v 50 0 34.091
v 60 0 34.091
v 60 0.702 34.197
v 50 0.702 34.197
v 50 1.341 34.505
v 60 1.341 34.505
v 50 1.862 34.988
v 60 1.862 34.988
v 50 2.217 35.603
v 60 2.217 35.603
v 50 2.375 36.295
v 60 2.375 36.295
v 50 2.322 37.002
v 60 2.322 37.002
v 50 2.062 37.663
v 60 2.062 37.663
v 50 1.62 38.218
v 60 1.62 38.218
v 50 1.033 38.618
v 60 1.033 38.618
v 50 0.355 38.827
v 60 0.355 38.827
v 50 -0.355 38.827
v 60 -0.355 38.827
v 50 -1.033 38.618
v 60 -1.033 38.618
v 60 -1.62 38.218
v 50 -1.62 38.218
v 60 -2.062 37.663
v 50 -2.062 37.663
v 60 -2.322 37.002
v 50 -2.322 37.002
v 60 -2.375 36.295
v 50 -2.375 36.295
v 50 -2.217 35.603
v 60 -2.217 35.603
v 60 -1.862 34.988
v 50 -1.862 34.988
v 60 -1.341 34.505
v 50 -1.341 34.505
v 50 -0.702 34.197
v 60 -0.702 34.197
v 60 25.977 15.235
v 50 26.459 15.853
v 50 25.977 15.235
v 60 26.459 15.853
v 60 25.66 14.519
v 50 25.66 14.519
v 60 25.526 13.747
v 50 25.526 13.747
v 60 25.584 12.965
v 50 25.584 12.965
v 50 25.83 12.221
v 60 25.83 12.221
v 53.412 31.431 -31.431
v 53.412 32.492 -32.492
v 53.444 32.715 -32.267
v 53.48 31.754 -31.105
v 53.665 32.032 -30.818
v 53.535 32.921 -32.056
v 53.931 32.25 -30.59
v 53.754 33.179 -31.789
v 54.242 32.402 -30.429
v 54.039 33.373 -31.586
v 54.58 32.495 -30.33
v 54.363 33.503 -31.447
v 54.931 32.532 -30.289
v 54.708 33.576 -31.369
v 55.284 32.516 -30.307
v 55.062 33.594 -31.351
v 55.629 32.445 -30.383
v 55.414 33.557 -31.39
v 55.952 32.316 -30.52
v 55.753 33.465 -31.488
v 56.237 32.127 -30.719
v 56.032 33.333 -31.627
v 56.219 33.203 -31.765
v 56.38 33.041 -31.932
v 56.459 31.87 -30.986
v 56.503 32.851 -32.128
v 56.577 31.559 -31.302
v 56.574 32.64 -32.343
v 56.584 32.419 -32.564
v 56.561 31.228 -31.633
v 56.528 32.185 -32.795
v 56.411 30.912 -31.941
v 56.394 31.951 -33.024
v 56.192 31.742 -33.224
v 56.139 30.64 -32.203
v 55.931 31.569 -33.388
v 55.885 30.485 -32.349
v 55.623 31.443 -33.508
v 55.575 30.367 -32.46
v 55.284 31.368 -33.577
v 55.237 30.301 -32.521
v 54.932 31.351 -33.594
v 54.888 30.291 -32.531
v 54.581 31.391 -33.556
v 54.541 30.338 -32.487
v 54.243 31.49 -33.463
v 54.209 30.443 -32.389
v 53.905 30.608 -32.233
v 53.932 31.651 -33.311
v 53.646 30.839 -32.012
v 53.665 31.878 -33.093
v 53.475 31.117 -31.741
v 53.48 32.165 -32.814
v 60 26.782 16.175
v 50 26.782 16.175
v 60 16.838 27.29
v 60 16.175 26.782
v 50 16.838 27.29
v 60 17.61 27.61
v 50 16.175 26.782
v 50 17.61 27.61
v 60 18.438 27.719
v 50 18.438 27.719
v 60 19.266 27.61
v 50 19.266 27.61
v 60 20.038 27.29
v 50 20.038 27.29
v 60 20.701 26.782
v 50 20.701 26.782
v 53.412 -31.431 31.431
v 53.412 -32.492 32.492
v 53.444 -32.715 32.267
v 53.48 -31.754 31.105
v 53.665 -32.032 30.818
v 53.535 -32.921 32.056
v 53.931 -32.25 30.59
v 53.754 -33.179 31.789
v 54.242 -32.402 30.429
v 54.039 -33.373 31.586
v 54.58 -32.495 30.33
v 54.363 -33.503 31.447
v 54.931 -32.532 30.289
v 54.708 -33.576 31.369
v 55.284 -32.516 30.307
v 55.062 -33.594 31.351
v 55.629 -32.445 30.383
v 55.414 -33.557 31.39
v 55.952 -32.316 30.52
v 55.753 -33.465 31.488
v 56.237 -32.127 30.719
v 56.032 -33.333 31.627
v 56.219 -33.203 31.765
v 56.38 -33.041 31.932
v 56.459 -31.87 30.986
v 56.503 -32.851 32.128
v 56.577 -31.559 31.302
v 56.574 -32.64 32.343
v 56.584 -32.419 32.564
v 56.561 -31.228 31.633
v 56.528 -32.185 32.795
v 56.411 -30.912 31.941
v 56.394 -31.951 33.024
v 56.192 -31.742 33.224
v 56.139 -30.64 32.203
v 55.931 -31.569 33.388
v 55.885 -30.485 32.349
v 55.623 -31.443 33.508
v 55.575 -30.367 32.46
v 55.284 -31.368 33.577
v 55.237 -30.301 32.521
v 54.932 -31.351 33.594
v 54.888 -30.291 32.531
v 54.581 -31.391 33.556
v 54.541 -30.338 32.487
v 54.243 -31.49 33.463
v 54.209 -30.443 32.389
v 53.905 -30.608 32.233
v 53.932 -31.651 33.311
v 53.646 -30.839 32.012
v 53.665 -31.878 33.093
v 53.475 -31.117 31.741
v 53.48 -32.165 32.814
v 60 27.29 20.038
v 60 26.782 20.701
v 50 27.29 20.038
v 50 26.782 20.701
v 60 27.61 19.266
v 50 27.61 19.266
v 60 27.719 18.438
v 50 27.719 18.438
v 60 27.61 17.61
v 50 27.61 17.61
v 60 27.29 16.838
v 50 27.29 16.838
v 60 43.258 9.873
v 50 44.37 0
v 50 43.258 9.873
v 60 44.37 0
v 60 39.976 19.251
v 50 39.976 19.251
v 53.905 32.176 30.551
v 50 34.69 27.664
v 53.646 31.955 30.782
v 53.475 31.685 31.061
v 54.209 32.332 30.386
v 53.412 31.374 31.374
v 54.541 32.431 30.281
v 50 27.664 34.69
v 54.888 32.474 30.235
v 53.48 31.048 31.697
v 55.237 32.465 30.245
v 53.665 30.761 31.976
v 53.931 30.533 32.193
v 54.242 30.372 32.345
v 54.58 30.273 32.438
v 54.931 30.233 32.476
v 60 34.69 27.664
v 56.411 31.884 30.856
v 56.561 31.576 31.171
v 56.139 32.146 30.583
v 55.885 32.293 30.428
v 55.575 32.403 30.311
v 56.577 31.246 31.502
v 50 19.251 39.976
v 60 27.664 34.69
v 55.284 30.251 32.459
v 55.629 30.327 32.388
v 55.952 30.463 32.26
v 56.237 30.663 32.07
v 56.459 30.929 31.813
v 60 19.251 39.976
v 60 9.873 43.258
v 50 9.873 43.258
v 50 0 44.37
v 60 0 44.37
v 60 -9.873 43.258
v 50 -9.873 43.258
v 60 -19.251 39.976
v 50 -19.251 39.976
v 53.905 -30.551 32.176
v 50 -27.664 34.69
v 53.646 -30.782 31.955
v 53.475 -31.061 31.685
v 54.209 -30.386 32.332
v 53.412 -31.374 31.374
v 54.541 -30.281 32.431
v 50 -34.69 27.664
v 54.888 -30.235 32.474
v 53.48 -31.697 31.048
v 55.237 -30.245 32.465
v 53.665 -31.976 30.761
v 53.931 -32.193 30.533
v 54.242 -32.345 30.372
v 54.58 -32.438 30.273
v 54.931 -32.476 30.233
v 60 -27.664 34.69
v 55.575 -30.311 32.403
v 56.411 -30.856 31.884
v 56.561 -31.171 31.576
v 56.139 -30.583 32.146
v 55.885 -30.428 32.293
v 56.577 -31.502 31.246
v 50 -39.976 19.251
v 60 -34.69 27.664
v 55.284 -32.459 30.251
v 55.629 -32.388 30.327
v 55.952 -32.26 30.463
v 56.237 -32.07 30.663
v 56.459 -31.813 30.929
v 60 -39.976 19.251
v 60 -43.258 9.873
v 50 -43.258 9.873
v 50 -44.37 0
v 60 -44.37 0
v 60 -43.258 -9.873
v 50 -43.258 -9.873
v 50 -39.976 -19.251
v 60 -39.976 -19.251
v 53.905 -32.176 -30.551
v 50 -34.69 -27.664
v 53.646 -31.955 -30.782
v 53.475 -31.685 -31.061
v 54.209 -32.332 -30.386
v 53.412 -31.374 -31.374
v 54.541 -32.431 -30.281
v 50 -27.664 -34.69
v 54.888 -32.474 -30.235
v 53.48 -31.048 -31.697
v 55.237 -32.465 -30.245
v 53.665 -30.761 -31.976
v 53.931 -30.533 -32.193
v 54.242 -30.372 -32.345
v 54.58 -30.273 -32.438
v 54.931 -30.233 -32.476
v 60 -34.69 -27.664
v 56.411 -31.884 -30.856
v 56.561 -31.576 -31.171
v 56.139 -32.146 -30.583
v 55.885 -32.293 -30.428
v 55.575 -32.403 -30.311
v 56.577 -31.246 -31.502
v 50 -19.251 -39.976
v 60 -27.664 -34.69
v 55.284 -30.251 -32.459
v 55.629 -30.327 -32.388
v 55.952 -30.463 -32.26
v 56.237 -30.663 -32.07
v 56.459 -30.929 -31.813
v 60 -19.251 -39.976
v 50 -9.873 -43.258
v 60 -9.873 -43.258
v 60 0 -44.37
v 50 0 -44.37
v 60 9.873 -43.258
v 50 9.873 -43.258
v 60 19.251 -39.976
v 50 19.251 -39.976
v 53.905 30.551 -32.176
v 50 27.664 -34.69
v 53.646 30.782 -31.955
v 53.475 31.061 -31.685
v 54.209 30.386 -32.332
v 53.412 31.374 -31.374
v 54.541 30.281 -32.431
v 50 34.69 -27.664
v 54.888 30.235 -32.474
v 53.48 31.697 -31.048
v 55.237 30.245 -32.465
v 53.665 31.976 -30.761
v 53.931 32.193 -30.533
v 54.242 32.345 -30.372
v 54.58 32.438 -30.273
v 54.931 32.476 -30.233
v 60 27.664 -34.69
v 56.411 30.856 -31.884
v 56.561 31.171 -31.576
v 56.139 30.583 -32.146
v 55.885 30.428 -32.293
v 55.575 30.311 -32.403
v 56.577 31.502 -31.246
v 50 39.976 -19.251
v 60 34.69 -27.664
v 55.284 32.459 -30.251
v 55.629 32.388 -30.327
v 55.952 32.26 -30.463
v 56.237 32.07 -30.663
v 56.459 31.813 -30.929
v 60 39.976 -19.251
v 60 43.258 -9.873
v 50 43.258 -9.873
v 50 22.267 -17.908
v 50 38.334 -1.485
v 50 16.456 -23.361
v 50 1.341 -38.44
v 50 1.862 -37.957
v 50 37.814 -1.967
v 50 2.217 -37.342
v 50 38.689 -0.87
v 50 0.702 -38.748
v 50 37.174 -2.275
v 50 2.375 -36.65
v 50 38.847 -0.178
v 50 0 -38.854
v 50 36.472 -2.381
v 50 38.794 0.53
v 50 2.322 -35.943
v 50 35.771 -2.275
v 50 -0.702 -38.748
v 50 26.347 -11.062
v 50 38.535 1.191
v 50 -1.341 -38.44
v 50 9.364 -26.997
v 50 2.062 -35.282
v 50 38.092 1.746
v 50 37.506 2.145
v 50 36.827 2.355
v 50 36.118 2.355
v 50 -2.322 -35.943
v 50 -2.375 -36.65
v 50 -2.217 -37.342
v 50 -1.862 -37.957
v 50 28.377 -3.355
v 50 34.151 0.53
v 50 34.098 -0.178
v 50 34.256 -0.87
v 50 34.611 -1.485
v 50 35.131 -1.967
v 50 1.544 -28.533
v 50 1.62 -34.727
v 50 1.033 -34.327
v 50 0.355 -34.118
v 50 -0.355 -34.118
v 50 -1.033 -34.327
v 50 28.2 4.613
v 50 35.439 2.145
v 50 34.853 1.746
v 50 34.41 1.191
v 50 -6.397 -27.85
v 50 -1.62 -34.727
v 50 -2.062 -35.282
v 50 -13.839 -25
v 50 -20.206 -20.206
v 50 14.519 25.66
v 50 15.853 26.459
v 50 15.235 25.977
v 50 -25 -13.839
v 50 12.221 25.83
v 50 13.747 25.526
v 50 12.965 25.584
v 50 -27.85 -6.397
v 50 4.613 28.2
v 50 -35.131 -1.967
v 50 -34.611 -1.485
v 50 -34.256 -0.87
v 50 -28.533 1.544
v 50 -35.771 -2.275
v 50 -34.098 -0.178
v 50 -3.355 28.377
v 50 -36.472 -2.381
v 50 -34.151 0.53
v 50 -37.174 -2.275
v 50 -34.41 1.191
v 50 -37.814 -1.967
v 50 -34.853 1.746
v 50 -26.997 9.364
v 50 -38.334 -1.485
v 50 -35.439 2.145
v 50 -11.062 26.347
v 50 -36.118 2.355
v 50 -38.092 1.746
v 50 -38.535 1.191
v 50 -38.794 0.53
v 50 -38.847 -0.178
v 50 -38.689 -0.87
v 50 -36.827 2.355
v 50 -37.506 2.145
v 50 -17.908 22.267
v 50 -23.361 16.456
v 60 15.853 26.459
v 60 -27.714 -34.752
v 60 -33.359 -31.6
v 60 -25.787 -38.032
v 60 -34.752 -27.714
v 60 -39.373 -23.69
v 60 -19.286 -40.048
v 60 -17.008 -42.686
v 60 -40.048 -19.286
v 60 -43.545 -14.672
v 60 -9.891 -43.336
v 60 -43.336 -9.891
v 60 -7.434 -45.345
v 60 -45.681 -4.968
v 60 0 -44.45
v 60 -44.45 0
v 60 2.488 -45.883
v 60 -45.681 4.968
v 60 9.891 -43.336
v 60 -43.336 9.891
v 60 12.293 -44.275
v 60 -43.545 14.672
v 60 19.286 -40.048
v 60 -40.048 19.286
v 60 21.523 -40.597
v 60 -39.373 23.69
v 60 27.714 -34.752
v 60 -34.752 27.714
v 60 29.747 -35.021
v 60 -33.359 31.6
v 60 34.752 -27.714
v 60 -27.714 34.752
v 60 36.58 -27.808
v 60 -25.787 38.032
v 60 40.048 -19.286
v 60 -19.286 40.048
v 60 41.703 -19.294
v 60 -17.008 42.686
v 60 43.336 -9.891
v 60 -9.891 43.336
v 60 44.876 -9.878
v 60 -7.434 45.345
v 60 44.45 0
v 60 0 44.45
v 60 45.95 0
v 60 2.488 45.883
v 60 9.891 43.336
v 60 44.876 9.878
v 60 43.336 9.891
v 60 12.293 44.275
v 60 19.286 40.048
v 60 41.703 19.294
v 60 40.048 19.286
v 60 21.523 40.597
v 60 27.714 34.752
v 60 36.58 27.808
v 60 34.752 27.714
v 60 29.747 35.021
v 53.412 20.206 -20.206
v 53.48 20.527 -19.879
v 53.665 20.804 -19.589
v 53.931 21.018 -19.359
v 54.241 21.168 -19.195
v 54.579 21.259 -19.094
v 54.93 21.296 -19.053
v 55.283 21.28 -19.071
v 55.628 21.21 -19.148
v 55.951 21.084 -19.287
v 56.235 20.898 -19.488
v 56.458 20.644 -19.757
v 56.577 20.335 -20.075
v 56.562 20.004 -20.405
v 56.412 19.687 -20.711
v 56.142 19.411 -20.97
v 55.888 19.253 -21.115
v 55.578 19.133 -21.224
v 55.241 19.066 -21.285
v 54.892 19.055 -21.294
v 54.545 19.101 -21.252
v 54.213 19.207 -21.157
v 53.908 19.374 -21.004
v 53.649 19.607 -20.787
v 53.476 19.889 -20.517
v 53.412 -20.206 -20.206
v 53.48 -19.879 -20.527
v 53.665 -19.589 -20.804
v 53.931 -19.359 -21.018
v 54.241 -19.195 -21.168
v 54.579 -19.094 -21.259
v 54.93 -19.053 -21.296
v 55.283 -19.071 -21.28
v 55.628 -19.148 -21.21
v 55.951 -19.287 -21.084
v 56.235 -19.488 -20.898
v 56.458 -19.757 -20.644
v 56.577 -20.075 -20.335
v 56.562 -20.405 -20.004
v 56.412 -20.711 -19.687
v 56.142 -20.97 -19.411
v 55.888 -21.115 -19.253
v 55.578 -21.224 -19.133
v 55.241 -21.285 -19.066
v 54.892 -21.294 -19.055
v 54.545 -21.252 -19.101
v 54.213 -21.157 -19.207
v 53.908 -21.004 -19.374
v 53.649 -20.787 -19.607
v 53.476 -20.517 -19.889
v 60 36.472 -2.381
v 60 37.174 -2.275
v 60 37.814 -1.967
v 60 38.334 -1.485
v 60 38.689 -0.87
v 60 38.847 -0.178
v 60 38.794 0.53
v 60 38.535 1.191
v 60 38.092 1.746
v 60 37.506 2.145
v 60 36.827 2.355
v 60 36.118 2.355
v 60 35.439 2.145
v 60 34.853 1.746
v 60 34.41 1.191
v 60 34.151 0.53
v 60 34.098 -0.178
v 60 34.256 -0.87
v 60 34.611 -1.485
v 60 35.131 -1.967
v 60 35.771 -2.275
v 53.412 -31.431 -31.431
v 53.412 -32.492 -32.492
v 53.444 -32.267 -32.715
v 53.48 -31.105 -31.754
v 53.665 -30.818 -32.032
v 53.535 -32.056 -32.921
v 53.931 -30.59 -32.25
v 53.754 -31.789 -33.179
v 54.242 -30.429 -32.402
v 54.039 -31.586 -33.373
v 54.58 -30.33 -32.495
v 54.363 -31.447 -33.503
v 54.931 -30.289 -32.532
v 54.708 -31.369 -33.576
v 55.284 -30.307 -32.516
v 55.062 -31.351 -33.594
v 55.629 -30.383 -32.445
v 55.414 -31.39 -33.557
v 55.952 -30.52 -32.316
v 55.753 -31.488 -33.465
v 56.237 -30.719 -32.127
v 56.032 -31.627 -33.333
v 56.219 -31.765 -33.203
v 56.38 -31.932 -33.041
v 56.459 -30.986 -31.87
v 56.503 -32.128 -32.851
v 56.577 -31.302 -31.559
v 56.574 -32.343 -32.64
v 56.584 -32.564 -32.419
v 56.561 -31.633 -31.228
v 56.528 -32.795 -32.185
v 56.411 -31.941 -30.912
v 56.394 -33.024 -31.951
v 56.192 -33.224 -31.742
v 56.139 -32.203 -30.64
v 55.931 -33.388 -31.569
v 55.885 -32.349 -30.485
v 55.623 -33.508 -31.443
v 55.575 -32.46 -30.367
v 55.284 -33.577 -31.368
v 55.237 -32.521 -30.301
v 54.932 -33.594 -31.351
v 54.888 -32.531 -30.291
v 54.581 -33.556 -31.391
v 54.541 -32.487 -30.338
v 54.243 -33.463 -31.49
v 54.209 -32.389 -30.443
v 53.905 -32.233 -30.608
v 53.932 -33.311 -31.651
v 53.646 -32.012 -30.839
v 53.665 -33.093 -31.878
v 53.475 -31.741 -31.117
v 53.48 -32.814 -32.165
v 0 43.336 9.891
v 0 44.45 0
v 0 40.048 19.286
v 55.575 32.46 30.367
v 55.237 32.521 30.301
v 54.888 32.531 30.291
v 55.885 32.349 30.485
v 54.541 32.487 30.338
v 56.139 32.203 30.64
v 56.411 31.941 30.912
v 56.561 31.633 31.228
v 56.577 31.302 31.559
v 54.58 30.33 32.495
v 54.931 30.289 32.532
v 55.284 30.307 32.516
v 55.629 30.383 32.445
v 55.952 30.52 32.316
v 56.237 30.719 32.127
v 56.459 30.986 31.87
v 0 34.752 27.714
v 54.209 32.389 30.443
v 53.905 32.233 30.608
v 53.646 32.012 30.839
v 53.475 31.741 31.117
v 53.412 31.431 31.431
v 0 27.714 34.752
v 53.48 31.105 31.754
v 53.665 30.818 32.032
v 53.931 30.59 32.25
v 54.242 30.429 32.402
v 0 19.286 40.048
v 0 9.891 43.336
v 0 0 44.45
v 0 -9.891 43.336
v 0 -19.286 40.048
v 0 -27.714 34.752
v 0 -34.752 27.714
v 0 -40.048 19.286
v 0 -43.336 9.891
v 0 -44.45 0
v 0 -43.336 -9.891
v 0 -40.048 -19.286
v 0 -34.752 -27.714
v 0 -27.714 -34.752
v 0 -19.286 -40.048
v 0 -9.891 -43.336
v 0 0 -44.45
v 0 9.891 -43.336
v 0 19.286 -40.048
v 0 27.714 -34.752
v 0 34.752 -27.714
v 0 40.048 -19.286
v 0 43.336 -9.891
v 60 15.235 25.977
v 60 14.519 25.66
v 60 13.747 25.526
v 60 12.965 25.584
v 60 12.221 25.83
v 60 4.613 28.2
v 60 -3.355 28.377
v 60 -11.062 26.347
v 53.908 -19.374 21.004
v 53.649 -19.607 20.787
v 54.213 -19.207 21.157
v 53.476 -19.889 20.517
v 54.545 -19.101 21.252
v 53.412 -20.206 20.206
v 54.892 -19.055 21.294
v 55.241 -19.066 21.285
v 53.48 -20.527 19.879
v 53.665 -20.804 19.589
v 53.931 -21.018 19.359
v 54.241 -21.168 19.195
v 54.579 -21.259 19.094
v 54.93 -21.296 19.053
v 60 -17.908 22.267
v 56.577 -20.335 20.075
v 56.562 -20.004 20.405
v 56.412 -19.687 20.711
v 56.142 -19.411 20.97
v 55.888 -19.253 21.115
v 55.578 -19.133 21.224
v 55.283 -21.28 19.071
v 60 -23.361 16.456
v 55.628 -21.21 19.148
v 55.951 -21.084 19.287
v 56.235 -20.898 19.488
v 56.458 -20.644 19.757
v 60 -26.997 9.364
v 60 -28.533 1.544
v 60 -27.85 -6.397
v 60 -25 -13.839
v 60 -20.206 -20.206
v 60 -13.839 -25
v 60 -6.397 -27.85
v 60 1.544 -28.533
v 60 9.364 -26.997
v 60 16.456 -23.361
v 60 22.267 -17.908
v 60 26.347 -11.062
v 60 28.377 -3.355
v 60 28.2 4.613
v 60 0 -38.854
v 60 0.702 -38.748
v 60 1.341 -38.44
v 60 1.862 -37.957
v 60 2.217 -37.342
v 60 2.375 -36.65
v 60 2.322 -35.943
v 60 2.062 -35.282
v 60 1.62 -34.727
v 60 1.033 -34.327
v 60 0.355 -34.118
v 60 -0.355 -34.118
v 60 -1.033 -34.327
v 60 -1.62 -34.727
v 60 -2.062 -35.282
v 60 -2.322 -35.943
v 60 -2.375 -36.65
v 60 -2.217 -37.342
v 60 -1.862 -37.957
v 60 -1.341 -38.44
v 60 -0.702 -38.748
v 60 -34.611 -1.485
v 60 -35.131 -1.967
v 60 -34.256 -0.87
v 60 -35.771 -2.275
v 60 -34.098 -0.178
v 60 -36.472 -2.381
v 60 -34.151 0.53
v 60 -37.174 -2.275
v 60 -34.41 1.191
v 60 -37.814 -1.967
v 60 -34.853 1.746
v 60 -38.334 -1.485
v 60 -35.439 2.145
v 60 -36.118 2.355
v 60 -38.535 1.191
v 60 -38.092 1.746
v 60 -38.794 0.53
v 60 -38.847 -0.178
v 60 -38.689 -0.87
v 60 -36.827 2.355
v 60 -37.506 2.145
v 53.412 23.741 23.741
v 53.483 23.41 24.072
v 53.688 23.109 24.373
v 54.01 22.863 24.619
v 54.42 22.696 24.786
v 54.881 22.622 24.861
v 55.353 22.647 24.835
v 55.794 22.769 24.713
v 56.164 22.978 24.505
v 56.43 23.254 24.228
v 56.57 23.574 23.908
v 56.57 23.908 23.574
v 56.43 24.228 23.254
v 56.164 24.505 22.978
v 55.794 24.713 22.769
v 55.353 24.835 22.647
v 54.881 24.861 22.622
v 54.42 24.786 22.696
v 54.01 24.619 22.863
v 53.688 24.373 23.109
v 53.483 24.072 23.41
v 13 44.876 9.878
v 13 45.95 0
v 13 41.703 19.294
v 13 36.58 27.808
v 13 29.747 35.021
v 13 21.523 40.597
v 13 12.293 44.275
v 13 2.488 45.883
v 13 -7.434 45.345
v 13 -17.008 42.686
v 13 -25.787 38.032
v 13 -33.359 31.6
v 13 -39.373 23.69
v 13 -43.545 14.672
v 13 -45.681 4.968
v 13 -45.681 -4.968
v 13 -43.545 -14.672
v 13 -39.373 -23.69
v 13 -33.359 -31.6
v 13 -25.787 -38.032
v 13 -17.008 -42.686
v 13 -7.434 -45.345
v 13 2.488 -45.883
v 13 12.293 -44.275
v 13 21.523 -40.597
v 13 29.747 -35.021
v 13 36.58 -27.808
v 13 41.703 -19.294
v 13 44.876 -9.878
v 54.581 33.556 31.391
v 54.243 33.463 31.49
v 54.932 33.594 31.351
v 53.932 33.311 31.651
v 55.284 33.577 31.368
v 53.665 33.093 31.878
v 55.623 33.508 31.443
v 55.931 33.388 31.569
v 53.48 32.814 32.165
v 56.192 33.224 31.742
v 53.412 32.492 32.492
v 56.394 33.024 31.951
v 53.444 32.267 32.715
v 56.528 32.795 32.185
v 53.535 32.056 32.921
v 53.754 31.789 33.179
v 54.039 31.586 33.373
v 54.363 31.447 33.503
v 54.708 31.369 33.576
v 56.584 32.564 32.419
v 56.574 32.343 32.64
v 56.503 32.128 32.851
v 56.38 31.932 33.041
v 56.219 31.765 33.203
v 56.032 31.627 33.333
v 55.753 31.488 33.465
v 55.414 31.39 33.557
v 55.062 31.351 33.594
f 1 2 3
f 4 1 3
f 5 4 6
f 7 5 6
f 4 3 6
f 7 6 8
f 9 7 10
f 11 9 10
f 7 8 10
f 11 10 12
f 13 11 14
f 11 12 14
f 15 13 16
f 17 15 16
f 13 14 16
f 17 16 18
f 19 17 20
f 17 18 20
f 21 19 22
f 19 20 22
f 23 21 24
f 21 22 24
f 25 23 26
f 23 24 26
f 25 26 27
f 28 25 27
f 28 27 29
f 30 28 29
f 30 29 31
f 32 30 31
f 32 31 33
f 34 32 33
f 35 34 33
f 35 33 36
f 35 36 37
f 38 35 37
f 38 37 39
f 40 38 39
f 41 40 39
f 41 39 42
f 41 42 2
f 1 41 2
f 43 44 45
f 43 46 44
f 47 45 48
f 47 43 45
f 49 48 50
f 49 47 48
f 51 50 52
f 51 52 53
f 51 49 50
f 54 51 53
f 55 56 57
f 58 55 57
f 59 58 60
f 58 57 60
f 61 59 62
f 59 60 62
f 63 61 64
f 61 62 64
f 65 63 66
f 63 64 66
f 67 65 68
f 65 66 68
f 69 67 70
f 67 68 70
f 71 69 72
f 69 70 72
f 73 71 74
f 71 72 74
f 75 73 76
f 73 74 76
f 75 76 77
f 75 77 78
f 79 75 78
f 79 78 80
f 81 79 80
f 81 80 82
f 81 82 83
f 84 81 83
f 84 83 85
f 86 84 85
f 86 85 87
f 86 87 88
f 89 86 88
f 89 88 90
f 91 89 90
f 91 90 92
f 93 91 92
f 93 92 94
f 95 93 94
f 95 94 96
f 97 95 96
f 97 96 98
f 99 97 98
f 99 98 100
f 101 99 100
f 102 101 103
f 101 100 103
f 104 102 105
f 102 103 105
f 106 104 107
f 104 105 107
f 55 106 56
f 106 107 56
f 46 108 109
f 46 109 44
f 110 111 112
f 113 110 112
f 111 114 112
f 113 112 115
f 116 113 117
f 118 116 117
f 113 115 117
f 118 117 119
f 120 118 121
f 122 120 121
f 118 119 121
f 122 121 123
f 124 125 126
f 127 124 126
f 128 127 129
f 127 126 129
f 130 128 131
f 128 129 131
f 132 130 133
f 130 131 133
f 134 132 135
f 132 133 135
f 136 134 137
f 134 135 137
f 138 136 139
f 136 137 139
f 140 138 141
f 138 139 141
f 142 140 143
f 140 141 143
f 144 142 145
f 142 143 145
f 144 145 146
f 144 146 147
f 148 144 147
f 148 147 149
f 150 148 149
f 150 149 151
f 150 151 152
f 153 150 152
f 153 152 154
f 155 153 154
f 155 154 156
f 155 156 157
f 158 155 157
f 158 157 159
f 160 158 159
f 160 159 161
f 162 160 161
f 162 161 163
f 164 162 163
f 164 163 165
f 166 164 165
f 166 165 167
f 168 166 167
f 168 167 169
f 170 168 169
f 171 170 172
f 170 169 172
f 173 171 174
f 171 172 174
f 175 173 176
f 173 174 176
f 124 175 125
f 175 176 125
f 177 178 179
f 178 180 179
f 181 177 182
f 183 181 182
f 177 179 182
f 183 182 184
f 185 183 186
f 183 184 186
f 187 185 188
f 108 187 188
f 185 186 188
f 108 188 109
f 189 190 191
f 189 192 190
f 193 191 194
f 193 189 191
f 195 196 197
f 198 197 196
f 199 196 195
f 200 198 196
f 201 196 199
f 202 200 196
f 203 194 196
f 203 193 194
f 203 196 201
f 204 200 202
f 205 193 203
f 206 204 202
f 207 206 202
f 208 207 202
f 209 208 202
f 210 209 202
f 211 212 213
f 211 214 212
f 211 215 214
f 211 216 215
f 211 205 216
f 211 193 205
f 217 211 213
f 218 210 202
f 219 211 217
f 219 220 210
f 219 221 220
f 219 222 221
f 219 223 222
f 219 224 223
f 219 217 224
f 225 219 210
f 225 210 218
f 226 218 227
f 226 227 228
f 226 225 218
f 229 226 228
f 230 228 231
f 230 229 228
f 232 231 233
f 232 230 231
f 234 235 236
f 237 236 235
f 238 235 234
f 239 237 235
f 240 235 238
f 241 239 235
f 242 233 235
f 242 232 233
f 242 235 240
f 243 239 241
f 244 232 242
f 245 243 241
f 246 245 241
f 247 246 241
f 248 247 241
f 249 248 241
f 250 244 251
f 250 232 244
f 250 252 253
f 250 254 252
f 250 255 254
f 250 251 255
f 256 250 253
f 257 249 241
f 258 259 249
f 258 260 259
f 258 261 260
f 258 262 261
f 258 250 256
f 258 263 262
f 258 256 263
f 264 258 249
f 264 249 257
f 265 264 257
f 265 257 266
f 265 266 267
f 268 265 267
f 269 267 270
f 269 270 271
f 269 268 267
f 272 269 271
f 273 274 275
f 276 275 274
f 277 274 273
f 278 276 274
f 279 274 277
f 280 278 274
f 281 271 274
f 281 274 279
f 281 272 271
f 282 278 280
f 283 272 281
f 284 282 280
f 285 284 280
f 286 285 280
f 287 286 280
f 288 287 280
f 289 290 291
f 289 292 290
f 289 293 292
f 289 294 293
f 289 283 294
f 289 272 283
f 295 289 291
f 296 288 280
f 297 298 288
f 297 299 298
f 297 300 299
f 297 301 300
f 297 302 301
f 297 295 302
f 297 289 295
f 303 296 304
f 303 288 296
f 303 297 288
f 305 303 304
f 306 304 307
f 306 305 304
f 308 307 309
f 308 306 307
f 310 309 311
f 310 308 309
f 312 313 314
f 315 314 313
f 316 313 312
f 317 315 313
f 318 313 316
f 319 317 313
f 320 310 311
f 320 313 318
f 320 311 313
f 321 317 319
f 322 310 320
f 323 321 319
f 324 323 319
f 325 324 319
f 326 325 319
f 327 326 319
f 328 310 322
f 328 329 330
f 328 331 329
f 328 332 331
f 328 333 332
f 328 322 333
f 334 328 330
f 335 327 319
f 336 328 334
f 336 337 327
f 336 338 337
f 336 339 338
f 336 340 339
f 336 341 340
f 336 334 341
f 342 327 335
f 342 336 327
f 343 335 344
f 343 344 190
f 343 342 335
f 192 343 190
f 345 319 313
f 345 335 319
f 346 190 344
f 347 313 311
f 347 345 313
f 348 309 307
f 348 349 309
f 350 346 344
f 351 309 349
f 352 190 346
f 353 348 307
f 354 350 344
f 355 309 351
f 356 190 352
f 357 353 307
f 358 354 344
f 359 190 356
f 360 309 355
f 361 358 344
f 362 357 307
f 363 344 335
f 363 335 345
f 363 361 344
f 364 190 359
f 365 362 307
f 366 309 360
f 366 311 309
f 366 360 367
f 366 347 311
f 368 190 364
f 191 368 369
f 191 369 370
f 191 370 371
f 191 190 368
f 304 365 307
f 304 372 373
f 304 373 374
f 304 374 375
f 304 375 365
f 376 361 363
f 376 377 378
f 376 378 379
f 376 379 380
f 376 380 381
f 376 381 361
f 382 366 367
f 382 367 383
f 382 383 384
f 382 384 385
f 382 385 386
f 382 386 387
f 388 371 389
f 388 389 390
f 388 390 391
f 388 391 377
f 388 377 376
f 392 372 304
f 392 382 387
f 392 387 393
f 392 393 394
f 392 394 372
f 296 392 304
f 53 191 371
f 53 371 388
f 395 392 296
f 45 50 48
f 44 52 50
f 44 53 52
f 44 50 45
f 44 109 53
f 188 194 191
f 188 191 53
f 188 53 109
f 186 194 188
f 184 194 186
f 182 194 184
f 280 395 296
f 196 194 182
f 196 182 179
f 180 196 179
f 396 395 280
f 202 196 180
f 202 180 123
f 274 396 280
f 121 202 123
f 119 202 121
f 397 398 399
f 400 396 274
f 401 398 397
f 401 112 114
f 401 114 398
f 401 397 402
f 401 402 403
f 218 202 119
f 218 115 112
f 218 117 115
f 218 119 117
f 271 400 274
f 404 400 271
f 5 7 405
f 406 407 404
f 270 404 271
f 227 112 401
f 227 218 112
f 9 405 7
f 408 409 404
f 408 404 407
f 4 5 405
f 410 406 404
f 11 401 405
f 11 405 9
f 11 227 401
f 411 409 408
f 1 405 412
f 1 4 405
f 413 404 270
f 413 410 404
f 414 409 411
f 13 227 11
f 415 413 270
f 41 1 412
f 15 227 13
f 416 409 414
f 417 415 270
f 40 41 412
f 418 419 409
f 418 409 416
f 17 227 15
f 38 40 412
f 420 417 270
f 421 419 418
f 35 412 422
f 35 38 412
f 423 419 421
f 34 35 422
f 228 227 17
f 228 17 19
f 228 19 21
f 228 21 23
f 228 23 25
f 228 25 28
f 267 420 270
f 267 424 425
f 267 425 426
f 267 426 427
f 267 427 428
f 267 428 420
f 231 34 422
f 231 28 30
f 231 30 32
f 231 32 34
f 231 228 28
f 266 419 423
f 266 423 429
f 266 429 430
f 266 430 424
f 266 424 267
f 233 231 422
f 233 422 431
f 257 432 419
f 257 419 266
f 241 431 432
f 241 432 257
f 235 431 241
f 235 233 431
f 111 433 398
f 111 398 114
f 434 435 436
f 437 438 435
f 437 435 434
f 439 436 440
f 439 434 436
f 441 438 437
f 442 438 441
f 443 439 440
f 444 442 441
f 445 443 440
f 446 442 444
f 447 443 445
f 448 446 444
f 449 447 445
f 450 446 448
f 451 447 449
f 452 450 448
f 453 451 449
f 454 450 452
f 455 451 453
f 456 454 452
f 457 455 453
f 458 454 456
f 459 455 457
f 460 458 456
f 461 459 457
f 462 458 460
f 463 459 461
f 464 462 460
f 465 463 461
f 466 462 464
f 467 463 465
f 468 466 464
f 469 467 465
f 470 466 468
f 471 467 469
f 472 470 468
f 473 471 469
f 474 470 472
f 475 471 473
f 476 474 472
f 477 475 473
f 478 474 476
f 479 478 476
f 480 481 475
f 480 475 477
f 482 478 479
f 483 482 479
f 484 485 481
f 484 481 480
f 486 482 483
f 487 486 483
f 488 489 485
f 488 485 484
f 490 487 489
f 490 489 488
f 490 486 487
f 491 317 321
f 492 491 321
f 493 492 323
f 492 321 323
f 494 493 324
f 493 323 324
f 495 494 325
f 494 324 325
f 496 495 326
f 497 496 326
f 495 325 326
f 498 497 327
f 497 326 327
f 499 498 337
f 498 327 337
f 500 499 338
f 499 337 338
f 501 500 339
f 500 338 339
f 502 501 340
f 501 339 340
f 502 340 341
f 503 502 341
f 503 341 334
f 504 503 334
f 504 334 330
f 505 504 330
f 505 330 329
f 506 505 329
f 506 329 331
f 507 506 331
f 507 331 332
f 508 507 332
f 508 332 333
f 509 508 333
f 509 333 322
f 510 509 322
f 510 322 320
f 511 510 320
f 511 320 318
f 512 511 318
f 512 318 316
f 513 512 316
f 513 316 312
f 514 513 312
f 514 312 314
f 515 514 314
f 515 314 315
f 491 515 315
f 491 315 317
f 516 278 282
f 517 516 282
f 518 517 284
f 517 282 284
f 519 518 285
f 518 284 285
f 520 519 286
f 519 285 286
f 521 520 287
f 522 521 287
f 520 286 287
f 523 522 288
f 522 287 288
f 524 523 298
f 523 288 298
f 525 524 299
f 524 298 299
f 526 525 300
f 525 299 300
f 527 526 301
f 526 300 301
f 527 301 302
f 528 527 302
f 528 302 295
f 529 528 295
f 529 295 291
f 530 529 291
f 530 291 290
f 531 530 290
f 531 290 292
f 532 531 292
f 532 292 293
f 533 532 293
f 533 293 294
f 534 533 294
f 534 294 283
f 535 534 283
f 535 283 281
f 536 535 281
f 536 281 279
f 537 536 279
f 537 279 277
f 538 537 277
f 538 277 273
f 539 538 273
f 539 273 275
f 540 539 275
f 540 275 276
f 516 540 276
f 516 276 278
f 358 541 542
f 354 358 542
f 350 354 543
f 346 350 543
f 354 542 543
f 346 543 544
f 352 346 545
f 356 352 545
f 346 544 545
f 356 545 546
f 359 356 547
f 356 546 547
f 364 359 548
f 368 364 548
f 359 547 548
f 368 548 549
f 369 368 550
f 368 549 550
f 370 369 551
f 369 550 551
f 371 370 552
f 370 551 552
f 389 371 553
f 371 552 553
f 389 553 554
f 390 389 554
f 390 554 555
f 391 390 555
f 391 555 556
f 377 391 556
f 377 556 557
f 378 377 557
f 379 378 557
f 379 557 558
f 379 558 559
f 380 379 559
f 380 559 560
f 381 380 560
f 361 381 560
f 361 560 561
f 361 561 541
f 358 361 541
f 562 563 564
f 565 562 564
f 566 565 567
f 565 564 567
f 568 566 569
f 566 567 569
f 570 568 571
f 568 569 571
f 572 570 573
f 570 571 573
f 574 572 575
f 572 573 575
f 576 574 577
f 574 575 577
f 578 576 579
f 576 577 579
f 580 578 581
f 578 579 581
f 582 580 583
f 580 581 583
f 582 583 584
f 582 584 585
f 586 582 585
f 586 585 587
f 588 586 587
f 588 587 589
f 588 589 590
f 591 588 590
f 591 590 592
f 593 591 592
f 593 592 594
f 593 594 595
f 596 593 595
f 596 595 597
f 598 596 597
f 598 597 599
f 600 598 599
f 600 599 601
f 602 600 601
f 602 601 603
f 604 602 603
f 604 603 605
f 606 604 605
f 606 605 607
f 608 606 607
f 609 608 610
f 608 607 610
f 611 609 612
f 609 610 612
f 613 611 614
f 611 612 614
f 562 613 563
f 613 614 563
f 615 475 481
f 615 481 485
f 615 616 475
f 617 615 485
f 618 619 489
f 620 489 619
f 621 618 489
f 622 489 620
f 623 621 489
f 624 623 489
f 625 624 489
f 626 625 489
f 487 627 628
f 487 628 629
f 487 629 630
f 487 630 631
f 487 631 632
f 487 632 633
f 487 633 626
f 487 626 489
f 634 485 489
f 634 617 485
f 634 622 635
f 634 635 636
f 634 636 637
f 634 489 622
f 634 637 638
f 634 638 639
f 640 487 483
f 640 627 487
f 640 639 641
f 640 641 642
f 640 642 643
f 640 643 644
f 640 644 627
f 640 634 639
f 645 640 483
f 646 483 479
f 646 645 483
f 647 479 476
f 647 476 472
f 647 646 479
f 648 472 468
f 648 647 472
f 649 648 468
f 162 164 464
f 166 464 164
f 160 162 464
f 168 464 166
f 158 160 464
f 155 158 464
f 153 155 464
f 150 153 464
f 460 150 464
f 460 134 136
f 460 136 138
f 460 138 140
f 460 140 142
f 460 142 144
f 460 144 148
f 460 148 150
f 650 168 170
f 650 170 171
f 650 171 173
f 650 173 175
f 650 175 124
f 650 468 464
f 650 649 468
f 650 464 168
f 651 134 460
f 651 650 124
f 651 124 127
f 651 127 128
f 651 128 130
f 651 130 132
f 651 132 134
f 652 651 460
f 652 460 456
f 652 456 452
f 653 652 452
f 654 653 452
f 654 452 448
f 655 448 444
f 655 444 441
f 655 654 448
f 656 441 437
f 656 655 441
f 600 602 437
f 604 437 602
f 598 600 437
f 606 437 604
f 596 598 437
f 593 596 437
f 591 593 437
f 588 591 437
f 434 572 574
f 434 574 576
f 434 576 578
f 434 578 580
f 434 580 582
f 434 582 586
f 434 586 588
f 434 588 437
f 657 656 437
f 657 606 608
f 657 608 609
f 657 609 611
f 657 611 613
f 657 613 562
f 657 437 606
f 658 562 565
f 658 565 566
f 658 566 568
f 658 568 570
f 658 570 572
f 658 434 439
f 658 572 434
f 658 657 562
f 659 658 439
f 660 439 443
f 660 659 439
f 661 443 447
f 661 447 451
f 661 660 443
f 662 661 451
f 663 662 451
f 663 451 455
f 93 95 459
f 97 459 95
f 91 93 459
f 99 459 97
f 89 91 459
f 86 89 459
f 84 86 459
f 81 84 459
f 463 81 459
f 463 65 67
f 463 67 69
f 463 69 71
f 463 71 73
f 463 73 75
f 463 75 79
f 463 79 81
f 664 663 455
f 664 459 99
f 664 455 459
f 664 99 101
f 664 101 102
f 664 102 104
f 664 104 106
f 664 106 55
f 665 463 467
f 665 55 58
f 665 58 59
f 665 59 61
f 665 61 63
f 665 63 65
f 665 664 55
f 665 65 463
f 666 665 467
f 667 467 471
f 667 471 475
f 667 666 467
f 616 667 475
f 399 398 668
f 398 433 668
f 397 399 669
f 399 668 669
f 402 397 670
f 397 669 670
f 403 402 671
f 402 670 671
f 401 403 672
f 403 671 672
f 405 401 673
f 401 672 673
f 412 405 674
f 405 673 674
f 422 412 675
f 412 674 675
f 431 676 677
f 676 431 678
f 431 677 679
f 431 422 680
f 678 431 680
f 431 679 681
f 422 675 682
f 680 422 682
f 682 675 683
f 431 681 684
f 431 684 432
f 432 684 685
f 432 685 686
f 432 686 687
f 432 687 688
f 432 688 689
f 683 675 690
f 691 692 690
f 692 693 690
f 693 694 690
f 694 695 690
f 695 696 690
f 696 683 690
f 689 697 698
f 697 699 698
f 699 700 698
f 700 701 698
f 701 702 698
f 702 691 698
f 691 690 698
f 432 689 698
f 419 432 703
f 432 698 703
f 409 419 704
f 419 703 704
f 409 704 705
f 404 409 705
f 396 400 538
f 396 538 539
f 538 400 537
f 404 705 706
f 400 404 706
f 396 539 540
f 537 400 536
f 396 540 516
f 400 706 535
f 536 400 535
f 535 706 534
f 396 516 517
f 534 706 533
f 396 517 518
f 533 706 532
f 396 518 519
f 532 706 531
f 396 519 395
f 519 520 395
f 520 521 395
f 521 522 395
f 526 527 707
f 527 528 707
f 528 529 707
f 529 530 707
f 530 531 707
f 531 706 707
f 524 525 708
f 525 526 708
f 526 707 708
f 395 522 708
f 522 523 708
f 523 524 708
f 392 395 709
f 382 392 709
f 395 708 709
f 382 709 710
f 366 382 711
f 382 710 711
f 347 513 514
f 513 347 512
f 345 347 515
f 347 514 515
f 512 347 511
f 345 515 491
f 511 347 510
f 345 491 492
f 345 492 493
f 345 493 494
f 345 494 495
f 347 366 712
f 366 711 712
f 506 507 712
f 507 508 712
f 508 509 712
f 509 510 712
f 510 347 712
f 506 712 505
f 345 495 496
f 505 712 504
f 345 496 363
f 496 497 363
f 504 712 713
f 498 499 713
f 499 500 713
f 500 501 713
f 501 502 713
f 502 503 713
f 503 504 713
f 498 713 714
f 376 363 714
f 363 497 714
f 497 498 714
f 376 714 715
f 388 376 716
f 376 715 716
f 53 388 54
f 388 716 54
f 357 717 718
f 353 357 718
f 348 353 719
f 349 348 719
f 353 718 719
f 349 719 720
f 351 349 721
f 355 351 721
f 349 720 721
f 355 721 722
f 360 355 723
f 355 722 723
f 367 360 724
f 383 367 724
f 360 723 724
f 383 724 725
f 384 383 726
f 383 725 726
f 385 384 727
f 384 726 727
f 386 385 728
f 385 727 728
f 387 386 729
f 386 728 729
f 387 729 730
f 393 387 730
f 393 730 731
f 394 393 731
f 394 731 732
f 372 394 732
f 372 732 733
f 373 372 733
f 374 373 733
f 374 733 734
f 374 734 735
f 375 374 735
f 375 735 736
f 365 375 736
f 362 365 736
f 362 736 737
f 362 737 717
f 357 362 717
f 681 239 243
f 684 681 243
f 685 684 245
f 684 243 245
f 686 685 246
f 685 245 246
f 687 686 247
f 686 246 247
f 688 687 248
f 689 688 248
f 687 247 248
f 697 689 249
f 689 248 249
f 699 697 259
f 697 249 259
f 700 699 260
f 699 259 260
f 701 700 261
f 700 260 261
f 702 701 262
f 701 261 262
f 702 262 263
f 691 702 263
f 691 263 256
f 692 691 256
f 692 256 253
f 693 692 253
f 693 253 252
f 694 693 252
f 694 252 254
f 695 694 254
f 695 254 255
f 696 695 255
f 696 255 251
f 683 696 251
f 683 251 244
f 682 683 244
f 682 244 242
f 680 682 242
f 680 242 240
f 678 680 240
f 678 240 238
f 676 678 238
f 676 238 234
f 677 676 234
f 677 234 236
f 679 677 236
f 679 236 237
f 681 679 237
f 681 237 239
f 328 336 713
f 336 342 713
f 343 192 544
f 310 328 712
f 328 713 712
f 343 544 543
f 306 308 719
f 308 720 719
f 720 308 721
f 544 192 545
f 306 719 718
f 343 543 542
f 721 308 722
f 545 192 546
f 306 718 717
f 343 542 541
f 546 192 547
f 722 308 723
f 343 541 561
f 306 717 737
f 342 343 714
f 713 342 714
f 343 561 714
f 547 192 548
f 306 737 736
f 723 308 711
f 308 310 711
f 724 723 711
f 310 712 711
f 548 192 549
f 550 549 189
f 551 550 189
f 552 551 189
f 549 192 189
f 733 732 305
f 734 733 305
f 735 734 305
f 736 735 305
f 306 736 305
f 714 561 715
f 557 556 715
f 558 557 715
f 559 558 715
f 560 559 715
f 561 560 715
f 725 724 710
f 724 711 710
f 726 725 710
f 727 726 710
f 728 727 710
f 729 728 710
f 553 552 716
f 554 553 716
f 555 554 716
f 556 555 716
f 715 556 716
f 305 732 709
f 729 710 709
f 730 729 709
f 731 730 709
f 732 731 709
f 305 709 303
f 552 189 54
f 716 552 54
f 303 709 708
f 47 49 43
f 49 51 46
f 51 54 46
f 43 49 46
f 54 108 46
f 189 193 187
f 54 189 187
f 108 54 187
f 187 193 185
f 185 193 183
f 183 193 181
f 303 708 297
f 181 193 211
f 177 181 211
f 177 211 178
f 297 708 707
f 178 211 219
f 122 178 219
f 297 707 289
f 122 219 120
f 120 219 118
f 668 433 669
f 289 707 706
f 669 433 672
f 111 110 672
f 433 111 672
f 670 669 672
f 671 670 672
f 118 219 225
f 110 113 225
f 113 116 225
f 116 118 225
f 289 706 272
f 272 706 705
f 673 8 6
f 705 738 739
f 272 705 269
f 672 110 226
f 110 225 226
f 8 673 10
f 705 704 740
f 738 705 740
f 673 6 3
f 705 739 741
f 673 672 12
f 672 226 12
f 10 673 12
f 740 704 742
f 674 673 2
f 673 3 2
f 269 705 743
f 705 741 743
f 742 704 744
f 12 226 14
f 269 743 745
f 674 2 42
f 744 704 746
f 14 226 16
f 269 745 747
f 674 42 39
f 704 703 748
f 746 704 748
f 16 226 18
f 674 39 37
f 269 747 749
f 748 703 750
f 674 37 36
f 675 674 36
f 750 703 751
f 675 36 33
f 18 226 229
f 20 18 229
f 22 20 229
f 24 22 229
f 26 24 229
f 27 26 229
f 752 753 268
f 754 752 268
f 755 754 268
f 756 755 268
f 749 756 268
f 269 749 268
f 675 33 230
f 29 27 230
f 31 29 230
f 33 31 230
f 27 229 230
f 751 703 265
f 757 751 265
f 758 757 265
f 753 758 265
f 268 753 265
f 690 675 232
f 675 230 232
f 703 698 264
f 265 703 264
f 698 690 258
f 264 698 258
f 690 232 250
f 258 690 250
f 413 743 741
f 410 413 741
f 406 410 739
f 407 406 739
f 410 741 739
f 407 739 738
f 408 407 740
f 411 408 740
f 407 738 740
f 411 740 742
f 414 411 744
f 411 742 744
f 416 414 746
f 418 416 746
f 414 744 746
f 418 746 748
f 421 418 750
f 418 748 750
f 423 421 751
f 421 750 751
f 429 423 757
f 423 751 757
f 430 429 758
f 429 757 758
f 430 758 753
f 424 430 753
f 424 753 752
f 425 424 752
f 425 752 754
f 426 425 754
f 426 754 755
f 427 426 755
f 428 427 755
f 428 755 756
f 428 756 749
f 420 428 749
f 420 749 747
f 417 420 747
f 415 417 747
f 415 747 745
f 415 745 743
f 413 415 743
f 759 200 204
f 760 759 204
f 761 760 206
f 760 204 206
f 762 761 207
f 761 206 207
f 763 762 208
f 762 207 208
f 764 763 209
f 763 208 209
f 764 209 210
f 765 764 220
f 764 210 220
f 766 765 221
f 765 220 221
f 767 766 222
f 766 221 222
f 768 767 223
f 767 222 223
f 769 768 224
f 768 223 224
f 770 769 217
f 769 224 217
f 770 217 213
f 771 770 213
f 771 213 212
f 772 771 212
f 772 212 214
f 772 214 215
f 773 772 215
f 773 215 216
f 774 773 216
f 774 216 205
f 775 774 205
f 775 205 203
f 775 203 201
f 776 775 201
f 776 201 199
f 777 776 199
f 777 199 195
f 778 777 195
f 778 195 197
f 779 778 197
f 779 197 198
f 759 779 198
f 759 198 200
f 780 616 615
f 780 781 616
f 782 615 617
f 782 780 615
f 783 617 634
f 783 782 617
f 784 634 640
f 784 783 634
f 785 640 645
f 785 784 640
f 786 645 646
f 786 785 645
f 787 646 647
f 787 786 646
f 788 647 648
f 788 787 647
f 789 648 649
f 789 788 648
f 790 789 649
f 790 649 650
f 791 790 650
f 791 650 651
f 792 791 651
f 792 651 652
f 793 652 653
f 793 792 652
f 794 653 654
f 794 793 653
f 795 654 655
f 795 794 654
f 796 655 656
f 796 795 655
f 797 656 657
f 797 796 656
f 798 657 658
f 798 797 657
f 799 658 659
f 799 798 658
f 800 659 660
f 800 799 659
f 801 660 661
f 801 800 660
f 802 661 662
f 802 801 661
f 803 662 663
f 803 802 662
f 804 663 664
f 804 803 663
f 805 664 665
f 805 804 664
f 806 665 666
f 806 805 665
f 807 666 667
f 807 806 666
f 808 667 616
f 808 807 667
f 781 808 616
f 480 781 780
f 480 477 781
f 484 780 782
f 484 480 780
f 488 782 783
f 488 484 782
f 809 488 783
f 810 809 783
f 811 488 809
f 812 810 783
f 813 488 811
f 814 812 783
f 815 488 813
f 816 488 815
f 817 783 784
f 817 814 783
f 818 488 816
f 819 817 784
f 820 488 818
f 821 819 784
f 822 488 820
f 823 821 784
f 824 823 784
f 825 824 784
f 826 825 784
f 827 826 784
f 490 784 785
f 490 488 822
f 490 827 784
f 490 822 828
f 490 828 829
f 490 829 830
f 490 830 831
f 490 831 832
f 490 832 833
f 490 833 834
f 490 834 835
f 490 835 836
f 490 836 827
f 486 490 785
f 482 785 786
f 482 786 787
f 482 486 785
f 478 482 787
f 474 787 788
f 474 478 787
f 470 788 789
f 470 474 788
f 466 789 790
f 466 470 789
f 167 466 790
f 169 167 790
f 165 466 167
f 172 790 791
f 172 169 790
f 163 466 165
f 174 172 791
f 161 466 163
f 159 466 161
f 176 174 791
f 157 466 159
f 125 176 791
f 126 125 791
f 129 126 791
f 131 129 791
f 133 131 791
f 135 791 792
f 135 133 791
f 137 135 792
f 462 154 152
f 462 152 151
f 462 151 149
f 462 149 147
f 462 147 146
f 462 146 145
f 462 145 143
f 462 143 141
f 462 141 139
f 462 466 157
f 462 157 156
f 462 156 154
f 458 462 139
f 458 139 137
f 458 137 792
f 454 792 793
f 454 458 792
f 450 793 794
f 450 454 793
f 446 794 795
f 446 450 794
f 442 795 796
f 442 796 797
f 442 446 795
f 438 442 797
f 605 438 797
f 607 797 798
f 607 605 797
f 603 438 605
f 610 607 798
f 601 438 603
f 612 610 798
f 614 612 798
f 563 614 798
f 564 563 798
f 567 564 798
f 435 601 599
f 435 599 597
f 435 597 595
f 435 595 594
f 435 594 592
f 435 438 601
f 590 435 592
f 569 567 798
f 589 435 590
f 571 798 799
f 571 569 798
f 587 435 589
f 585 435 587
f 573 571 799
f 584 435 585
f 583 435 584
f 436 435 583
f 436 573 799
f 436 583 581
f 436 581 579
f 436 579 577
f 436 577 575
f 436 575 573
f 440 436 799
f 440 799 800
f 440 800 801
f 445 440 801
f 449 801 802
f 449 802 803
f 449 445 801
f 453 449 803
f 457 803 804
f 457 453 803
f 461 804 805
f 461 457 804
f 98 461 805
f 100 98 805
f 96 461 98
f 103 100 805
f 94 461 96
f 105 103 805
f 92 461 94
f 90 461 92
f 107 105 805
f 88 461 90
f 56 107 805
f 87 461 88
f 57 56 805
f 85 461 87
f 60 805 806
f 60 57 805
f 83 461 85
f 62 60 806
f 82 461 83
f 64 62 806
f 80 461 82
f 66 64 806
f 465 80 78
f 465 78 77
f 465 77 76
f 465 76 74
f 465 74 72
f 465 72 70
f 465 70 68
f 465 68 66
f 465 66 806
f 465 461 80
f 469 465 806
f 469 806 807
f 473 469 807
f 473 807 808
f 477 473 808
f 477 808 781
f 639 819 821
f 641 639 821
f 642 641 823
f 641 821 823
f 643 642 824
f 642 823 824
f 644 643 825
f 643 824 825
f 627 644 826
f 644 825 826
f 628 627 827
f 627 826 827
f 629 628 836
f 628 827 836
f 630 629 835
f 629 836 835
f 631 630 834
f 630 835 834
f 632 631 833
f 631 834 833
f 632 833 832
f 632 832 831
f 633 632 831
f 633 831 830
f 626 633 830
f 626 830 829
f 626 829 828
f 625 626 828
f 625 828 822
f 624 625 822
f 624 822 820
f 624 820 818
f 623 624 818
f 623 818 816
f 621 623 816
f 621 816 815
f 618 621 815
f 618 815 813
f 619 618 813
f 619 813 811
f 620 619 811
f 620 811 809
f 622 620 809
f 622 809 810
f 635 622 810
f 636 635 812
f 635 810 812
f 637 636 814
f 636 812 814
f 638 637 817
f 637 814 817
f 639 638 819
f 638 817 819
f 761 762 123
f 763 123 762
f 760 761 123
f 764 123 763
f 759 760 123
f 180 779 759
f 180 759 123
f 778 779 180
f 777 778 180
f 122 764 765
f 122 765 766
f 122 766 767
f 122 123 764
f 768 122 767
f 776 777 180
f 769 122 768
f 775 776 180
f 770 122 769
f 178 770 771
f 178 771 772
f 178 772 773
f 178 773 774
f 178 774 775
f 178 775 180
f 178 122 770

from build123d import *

# Parameters (mm, degrees)
SKETCH2_W          = 10
SKETCH2_H          = 15.795
SKETCH3_R          = 2.38125
CUT_EXTRUDE1_DEPTH = 61
SKETCH4_R          = 1.5875
CUT_EXTRUDE2_DEPTH = 17.419131
CIRPATTERN1_COUNT  = 4
CUT_EXTRUDE3_DEPTH = 10
FILLET1_R          = 3.2


with BuildPart() as part:
    # Sketch1 → Revolve1 (revolve)
    with BuildSketch(Plane.XY):
        Polygon((13, 45.95), (60, 45.95), (60, 44.45), (0, 44.45), align=None)
    revolve(axis=Axis((0, 0, 0), (1, 0, 0)))


with BuildPart() as body_2:
    # Sketch2 → Revolve2 (revolve)
    with BuildSketch(Plane.XY):
        with Locations((55, 36.4725)):
            Rectangle(SKETCH2_W, SKETCH2_H)
    revolve(axis=Axis((0, 0, 0), (1, 0, 0)))

    # Sketch3 → Cut-Extrude1 (cut, through all)
    with BuildSketch(Plane(origin=(60, 0, 0), x_dir=(0, 0, -1), z_dir=(1, 0, 0))):
        with Locations((-36.4725, 0)):
            Circle(SKETCH3_R)
        with Locations((0, 36.4725)):
            Circle(SKETCH3_R)
        with Locations((36.4725, 0)):
            Circle(SKETCH3_R)
        with Locations((0, -36.4725)):
            Circle(SKETCH3_R)
    extrude(amount=-CUT_EXTRUDE1_DEPTH, mode=Mode.SUBTRACT)


with BuildPart() as cut_extrude2_tool:
    # Sketch4 → Cut-Extrude2 (new body)
    with BuildSketch(Plane(origin=(0, 32.491556596, 32.491556596), x_dir=(-1, 0, 0), z_dir=(0, 0.707106781, 0.707106781))):
        with Locations((-55, 0)):
            Circle(SKETCH4_R)
    cut_extrude2 = extrude(amount=-CUT_EXTRUDE2_DEPTH)


with BuildPart() as part_1:
    add(part.part)

    # Cut-Extrude2: cut by cut_extrude2_tool
    add(cut_extrude2_tool.part, mode=Mode.SUBTRACT)


with BuildPart() as body_2_1:
    add(body_2.part)

    # Cut-Extrude2: cut by cut_extrude2_tool
    add(cut_extrude2_tool.part, mode=Mode.SUBTRACT)


with BuildPart() as cirpattern1_tool:
    # CirPattern1: Cut-Extrude2 ×4 about axis
    cirpattern1_axis = Axis((60, 0, 0), (-1, 0, 0))
    for i in range(1, CIRPATTERN1_COUNT):
        add(cut_extrude2.rotate(cirpattern1_axis, i * 360 / CIRPATTERN1_COUNT))


with BuildPart() as part_2:
    add(part_1.part)

    # CirPattern1: cut by cirpattern1_tool
    add(cirpattern1_tool.part, mode=Mode.SUBTRACT)


with BuildPart() as body_2_2:
    add(body_2_1.part)

    # CirPattern1: cut by cirpattern1_tool
    add(cirpattern1_tool.part, mode=Mode.SUBTRACT)

    # Sketch5 → Cut-Extrude3 (cut)
    with BuildSketch(Plane(origin=(60, 0, 0), x_dir=(0, 0, -1), z_dir=(1, 0, 0))):
        Polygon((-29.044411037, 18.437809319), (-18.437809319, 29.044411037), (-11.366741508, 21.973343225), (-21.973343225, 11.366741508), align=None)
    extrude(amount=-CUT_EXTRUDE3_DEPTH, mode=Mode.SUBTRACT)

    # Fillet1
    fillet1_edges = [body_2_2.edges().sort_by_distance(p)[0] for p in [
        (55, 14.193886438, 24.800488156),
        (55, 24.800488156, 14.193886438),
        (55, 29.044411037, 18.437809319),
        (55, 18.437809319, 29.044411037),
    ]]
    fillet(fillet1_edges, radius=FILLET1_R)


solid = Compound([part_2.part, body_2_2.part])
